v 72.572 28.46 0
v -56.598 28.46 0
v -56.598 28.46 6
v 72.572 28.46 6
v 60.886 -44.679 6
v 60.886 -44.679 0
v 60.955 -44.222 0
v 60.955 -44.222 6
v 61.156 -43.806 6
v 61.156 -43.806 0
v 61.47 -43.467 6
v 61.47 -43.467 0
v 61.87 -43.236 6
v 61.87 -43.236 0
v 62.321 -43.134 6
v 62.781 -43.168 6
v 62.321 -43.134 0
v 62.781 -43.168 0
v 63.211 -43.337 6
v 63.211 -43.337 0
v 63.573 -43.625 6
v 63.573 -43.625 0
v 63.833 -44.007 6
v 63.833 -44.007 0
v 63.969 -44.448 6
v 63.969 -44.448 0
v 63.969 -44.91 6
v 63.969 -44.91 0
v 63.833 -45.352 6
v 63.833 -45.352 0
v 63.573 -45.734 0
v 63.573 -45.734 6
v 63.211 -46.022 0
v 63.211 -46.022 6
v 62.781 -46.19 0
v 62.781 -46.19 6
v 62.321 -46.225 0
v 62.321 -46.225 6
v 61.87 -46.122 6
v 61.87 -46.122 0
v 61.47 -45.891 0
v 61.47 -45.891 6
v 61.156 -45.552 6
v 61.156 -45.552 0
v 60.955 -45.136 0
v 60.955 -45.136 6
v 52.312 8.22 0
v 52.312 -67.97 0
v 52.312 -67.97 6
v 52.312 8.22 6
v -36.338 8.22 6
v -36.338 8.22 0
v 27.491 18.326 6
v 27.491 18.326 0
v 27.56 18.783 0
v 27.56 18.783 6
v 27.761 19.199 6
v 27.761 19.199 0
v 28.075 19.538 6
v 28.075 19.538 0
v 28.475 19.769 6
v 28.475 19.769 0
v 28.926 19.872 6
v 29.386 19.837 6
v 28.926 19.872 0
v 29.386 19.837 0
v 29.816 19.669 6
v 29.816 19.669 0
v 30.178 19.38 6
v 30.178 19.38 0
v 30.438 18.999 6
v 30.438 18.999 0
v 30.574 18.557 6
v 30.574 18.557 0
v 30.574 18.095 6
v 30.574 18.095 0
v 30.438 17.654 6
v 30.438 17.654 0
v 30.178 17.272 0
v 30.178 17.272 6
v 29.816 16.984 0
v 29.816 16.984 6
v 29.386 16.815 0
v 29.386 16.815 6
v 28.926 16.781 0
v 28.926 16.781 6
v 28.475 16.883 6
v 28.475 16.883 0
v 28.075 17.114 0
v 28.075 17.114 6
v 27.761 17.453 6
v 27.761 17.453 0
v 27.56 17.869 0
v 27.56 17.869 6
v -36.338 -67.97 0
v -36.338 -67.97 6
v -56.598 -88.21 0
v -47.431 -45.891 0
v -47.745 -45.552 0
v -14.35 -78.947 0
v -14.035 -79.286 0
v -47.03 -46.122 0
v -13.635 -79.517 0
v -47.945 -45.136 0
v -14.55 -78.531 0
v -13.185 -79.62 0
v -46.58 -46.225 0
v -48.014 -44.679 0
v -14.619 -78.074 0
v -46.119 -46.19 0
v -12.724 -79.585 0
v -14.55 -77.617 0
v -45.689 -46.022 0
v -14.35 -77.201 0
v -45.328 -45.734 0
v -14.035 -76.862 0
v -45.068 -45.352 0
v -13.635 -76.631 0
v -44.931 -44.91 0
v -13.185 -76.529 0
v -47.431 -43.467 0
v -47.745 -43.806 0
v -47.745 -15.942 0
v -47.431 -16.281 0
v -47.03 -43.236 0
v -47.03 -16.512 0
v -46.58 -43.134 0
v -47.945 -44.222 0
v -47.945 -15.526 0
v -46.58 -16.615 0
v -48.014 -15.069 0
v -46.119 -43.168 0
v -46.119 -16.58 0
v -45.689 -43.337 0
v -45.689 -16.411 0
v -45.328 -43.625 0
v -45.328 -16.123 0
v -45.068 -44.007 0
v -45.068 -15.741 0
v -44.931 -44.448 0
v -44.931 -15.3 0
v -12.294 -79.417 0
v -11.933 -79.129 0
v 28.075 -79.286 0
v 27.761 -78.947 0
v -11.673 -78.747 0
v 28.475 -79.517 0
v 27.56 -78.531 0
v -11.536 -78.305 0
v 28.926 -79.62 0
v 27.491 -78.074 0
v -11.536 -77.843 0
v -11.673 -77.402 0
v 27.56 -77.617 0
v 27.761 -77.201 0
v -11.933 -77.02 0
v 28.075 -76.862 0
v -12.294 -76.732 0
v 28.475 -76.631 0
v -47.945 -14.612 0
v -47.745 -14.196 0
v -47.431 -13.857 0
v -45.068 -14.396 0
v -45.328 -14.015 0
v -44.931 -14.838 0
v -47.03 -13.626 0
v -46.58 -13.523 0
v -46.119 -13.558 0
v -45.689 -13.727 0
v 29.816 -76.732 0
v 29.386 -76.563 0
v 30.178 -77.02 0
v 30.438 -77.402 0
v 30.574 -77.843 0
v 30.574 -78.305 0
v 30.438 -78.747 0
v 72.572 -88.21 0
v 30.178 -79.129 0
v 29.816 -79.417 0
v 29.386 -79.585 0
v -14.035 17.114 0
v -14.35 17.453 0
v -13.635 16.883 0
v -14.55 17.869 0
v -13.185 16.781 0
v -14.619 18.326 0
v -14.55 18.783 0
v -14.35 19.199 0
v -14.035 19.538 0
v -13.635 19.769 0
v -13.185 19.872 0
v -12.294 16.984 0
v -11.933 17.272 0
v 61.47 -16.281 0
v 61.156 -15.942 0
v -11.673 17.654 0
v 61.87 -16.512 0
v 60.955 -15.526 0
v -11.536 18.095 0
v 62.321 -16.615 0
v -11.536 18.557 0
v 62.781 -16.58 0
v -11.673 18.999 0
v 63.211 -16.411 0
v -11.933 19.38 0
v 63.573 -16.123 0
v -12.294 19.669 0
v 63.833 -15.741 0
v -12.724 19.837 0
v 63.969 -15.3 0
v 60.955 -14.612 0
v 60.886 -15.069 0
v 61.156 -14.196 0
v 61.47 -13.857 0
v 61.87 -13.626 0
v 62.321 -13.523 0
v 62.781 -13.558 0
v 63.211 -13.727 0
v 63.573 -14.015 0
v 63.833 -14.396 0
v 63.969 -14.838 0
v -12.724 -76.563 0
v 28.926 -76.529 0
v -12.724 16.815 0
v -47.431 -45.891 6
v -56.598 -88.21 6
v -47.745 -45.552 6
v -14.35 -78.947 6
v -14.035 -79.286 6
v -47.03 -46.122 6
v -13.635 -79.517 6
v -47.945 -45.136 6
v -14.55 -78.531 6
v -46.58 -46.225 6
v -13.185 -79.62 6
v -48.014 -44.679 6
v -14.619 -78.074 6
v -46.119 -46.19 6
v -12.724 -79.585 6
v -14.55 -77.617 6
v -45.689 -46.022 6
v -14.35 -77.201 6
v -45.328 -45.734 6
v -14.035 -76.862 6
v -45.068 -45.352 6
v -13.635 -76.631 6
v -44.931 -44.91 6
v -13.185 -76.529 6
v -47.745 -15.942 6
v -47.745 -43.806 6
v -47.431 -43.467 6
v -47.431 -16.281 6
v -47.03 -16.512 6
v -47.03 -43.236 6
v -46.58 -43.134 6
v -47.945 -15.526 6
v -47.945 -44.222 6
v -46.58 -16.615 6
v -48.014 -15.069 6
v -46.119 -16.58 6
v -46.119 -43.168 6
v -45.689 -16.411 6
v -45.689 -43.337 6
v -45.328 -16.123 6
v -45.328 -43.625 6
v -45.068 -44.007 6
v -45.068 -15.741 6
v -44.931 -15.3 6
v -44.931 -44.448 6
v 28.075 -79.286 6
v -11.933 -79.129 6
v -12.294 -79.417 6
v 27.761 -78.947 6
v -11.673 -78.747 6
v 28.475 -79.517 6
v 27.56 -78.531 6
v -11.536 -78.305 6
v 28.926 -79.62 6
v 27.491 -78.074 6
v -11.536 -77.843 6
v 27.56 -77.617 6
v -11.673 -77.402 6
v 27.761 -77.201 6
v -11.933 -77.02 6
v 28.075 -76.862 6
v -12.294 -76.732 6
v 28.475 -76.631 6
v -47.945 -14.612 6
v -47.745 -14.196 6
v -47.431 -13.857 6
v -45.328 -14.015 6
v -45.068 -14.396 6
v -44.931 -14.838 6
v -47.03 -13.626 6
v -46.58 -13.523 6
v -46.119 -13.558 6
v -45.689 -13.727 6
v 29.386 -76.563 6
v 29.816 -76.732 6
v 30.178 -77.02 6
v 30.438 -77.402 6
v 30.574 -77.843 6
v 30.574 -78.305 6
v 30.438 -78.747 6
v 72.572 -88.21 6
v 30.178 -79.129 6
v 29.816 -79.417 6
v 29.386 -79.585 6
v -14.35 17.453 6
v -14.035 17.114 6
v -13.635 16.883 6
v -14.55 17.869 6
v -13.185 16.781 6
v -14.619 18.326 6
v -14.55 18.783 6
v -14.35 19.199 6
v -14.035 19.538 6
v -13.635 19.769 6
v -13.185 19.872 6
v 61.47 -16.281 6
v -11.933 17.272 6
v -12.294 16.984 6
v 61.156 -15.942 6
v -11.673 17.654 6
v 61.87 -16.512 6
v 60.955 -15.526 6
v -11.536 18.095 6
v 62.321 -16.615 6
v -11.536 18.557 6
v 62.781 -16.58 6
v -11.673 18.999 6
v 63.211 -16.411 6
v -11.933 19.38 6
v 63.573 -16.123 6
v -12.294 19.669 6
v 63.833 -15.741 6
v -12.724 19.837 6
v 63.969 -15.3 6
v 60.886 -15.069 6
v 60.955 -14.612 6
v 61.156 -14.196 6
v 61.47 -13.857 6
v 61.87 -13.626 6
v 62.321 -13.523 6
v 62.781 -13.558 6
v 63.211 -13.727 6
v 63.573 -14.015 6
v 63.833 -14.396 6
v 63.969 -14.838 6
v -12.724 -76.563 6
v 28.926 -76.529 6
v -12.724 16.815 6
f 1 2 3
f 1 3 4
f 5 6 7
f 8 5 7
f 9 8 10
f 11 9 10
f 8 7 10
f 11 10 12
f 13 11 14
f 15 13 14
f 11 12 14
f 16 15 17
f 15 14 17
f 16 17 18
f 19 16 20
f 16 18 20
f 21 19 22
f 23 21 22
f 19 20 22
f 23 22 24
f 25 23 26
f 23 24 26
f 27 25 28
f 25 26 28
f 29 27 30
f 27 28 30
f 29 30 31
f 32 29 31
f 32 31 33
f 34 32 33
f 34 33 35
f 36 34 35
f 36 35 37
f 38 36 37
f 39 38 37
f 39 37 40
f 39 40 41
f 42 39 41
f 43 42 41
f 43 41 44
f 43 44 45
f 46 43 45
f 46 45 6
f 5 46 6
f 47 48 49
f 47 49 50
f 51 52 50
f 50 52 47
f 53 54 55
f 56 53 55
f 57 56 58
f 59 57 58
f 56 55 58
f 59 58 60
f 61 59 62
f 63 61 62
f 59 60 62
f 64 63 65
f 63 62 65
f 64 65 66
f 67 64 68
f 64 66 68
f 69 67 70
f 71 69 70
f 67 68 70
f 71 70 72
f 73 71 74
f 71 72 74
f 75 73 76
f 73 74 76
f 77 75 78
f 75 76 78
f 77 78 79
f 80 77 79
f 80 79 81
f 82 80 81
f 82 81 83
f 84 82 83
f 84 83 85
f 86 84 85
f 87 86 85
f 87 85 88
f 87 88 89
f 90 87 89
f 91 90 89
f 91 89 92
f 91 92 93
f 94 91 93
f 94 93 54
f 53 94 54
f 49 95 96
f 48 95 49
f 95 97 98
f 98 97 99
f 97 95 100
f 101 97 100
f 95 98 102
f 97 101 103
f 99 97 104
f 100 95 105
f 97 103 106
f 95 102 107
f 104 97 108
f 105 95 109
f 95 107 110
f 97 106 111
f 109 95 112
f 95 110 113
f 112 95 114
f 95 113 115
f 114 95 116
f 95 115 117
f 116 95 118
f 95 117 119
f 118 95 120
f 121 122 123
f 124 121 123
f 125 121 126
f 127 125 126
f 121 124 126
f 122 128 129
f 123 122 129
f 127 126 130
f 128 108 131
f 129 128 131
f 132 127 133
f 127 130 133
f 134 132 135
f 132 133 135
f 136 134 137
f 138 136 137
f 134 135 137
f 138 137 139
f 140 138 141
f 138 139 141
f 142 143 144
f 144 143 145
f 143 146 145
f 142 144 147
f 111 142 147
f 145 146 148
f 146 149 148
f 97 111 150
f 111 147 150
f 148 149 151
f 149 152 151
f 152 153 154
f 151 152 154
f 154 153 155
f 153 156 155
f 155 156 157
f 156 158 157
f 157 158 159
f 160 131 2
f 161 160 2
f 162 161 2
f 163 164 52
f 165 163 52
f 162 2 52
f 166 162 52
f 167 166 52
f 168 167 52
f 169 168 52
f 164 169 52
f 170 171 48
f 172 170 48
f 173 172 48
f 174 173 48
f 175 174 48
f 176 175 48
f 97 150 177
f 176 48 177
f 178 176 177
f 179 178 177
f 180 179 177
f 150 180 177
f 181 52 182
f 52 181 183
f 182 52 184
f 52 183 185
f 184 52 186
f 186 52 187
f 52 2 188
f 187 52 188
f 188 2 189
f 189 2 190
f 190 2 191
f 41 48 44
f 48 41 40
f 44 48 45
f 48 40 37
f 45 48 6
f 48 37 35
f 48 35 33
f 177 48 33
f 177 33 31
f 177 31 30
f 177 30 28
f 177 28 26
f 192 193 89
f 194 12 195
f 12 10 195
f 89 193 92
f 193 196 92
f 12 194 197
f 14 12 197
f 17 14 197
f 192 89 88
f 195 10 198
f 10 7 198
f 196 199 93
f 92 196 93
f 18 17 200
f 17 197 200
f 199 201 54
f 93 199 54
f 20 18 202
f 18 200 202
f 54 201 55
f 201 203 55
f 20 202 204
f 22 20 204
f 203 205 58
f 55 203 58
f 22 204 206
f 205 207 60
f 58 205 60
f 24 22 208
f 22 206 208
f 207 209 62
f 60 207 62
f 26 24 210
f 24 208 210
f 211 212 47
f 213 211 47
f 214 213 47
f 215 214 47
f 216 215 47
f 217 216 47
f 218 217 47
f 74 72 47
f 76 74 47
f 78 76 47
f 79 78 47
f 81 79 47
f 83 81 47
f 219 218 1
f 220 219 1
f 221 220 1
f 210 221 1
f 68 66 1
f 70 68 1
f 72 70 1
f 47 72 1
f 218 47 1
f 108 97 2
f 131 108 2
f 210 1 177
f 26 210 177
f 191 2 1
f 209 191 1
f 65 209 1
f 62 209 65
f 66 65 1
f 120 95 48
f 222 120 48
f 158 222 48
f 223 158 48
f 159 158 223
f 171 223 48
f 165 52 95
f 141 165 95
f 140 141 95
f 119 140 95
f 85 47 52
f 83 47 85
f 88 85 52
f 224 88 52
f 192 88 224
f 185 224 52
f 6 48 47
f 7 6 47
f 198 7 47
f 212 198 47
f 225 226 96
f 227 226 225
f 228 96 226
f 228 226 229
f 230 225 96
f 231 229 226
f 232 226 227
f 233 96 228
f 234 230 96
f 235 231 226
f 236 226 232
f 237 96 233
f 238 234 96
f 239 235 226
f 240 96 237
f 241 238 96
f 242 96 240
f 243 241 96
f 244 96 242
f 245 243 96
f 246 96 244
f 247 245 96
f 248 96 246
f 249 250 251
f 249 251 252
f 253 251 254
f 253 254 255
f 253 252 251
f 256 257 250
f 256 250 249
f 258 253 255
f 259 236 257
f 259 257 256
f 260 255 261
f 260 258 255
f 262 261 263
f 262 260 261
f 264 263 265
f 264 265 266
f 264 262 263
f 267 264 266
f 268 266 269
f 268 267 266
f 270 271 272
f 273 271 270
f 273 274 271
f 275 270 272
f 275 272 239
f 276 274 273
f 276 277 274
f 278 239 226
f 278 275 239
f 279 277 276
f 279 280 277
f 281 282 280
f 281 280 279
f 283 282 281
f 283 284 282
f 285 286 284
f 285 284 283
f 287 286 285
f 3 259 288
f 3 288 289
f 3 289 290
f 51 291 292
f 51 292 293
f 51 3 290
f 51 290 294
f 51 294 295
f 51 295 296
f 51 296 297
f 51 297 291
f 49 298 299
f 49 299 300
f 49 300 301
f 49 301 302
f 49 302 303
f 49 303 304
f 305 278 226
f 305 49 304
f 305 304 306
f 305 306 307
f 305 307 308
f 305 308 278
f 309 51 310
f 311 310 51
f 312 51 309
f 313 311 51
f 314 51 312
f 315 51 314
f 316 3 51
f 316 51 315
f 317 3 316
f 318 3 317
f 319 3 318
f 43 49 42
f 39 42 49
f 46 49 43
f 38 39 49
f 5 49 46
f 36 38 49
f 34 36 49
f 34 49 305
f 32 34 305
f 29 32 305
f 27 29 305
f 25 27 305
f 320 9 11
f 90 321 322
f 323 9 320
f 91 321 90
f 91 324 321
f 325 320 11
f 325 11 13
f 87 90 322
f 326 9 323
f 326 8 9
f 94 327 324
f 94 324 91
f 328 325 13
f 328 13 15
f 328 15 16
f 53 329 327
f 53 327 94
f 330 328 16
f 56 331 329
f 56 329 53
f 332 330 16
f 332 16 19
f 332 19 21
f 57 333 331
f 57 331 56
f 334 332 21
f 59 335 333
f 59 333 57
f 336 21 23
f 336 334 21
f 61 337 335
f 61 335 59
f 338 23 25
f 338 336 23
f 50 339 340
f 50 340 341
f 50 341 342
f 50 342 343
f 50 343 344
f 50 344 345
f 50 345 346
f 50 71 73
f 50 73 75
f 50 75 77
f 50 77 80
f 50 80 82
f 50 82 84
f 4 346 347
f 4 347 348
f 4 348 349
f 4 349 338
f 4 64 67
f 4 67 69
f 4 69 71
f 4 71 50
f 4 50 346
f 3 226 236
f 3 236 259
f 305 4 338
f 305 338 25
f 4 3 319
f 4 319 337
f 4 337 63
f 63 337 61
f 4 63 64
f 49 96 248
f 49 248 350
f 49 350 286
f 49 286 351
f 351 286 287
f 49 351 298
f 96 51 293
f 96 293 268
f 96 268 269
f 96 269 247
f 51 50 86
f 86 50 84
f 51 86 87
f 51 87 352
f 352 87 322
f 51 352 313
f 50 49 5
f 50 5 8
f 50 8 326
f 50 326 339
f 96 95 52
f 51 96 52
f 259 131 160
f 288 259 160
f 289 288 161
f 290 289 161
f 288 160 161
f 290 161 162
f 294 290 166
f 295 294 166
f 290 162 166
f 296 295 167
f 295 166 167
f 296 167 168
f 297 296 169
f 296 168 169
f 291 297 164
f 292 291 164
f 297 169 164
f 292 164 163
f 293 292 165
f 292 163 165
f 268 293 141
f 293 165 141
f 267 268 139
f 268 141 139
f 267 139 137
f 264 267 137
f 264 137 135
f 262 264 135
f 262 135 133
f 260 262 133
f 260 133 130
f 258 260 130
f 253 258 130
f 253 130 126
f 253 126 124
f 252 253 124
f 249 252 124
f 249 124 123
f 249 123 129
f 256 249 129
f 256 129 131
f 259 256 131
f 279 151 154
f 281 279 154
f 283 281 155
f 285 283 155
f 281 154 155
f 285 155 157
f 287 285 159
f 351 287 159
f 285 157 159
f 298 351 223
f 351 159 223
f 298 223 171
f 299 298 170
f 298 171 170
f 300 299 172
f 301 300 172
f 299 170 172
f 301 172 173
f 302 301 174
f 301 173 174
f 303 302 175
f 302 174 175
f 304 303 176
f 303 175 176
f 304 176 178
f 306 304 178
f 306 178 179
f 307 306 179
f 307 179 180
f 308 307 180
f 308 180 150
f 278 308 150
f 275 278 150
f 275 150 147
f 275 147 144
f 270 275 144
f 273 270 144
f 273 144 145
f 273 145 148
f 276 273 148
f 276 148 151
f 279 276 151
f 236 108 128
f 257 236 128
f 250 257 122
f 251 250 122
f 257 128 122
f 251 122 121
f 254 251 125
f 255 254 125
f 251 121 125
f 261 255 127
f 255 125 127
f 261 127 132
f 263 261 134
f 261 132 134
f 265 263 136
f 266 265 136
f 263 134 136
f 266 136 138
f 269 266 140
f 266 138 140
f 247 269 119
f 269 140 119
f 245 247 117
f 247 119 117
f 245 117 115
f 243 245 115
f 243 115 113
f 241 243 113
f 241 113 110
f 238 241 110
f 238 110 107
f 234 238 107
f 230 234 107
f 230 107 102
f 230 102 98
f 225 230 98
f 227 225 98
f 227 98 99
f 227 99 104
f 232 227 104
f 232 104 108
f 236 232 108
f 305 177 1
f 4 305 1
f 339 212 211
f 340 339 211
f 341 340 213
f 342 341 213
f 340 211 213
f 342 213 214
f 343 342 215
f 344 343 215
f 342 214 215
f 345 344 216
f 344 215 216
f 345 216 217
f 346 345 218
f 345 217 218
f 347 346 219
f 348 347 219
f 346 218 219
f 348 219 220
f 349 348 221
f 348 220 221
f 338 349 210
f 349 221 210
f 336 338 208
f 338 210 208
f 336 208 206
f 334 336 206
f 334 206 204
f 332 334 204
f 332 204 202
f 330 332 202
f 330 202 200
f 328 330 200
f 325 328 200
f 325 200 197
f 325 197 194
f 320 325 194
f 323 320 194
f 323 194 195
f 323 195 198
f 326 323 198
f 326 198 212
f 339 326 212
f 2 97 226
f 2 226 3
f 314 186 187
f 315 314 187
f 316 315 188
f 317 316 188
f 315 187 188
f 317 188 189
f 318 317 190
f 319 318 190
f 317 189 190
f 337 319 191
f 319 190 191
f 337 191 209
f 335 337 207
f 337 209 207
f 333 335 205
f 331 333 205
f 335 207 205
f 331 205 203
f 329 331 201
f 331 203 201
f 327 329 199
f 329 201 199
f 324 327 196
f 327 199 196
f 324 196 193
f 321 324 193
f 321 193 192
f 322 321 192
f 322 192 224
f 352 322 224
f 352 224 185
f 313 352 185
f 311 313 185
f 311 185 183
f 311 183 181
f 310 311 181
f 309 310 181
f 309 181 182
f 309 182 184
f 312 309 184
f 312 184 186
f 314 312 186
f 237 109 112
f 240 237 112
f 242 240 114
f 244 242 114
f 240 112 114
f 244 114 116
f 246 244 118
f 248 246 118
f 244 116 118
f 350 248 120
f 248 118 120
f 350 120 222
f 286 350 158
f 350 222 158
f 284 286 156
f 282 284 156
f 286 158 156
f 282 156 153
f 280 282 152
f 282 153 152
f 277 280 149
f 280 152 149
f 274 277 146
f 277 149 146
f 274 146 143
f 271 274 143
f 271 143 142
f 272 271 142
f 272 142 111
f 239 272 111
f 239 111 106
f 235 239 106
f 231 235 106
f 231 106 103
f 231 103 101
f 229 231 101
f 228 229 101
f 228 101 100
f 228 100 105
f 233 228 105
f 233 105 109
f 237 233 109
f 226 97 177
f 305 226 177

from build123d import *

# Parameters (mm, degrees)
SKETCH_1_W          = 129.17
SKETCH_1_H          = 116.67
SKETCH_1_W_2        = 88.65
SKETCH_1_H_2        = 76.19
EXTRUDE_1_DEPTH     = 6
SKETCH_2_R          = 1.55
CUT_EXTRUDE_1_DEPTH = 115.383560689


with BuildPart() as part:
    # Эскиз1 → Бобышка-Вытянуть1 (new body)
    with BuildSketch(Plane.XY):
        with Locations((7.986729107, -29.874654179)):
            Rectangle(SKETCH_1_W, SKETCH_1_H)
        with Locations((7.986729107, -29.874654179)):
            Rectangle(SKETCH_1_W_2, SKETCH_1_H_2, mode=Mode.SUBTRACT)
    extrude(amount=EXTRUDE_1_DEPTH)

    # Эскиз2 → Вырез-Вытянуть1 (cut, through all)
    with BuildSketch(Plane(origin=(0, 0, 0), x_dir=(-1, 0, 0), z_dir=(0, 0, -1))):
        with Locations((46.464144791, -15.068841065)):
            Circle(SKETCH_2_R)
        with Locations((46.464144791, -44.679267292)):
            Circle(SKETCH_2_R)
        with Locations((13.069084007, -78.074328076)):
            Circle(SKETCH_2_R)
        with Locations((-29.04134222, -78.074328076)):
            Circle(SKETCH_2_R)
        with Locations((-62.436403004, -44.679267292)):
            Circle(SKETCH_2_R)
        with Locations((-62.436403004, -15.068841065)):
            Circle(SKETCH_2_R)
        with Locations((-29.04134222, 18.326219719)):
            Circle(SKETCH_2_R)
        with Locations((13.069084007, 18.326219719)):
            Circle(SKETCH_2_R)
    extrude(amount=-CUT_EXTRUDE_1_DEPTH, mode=Mode.SUBTRACT)


solid = part.part
